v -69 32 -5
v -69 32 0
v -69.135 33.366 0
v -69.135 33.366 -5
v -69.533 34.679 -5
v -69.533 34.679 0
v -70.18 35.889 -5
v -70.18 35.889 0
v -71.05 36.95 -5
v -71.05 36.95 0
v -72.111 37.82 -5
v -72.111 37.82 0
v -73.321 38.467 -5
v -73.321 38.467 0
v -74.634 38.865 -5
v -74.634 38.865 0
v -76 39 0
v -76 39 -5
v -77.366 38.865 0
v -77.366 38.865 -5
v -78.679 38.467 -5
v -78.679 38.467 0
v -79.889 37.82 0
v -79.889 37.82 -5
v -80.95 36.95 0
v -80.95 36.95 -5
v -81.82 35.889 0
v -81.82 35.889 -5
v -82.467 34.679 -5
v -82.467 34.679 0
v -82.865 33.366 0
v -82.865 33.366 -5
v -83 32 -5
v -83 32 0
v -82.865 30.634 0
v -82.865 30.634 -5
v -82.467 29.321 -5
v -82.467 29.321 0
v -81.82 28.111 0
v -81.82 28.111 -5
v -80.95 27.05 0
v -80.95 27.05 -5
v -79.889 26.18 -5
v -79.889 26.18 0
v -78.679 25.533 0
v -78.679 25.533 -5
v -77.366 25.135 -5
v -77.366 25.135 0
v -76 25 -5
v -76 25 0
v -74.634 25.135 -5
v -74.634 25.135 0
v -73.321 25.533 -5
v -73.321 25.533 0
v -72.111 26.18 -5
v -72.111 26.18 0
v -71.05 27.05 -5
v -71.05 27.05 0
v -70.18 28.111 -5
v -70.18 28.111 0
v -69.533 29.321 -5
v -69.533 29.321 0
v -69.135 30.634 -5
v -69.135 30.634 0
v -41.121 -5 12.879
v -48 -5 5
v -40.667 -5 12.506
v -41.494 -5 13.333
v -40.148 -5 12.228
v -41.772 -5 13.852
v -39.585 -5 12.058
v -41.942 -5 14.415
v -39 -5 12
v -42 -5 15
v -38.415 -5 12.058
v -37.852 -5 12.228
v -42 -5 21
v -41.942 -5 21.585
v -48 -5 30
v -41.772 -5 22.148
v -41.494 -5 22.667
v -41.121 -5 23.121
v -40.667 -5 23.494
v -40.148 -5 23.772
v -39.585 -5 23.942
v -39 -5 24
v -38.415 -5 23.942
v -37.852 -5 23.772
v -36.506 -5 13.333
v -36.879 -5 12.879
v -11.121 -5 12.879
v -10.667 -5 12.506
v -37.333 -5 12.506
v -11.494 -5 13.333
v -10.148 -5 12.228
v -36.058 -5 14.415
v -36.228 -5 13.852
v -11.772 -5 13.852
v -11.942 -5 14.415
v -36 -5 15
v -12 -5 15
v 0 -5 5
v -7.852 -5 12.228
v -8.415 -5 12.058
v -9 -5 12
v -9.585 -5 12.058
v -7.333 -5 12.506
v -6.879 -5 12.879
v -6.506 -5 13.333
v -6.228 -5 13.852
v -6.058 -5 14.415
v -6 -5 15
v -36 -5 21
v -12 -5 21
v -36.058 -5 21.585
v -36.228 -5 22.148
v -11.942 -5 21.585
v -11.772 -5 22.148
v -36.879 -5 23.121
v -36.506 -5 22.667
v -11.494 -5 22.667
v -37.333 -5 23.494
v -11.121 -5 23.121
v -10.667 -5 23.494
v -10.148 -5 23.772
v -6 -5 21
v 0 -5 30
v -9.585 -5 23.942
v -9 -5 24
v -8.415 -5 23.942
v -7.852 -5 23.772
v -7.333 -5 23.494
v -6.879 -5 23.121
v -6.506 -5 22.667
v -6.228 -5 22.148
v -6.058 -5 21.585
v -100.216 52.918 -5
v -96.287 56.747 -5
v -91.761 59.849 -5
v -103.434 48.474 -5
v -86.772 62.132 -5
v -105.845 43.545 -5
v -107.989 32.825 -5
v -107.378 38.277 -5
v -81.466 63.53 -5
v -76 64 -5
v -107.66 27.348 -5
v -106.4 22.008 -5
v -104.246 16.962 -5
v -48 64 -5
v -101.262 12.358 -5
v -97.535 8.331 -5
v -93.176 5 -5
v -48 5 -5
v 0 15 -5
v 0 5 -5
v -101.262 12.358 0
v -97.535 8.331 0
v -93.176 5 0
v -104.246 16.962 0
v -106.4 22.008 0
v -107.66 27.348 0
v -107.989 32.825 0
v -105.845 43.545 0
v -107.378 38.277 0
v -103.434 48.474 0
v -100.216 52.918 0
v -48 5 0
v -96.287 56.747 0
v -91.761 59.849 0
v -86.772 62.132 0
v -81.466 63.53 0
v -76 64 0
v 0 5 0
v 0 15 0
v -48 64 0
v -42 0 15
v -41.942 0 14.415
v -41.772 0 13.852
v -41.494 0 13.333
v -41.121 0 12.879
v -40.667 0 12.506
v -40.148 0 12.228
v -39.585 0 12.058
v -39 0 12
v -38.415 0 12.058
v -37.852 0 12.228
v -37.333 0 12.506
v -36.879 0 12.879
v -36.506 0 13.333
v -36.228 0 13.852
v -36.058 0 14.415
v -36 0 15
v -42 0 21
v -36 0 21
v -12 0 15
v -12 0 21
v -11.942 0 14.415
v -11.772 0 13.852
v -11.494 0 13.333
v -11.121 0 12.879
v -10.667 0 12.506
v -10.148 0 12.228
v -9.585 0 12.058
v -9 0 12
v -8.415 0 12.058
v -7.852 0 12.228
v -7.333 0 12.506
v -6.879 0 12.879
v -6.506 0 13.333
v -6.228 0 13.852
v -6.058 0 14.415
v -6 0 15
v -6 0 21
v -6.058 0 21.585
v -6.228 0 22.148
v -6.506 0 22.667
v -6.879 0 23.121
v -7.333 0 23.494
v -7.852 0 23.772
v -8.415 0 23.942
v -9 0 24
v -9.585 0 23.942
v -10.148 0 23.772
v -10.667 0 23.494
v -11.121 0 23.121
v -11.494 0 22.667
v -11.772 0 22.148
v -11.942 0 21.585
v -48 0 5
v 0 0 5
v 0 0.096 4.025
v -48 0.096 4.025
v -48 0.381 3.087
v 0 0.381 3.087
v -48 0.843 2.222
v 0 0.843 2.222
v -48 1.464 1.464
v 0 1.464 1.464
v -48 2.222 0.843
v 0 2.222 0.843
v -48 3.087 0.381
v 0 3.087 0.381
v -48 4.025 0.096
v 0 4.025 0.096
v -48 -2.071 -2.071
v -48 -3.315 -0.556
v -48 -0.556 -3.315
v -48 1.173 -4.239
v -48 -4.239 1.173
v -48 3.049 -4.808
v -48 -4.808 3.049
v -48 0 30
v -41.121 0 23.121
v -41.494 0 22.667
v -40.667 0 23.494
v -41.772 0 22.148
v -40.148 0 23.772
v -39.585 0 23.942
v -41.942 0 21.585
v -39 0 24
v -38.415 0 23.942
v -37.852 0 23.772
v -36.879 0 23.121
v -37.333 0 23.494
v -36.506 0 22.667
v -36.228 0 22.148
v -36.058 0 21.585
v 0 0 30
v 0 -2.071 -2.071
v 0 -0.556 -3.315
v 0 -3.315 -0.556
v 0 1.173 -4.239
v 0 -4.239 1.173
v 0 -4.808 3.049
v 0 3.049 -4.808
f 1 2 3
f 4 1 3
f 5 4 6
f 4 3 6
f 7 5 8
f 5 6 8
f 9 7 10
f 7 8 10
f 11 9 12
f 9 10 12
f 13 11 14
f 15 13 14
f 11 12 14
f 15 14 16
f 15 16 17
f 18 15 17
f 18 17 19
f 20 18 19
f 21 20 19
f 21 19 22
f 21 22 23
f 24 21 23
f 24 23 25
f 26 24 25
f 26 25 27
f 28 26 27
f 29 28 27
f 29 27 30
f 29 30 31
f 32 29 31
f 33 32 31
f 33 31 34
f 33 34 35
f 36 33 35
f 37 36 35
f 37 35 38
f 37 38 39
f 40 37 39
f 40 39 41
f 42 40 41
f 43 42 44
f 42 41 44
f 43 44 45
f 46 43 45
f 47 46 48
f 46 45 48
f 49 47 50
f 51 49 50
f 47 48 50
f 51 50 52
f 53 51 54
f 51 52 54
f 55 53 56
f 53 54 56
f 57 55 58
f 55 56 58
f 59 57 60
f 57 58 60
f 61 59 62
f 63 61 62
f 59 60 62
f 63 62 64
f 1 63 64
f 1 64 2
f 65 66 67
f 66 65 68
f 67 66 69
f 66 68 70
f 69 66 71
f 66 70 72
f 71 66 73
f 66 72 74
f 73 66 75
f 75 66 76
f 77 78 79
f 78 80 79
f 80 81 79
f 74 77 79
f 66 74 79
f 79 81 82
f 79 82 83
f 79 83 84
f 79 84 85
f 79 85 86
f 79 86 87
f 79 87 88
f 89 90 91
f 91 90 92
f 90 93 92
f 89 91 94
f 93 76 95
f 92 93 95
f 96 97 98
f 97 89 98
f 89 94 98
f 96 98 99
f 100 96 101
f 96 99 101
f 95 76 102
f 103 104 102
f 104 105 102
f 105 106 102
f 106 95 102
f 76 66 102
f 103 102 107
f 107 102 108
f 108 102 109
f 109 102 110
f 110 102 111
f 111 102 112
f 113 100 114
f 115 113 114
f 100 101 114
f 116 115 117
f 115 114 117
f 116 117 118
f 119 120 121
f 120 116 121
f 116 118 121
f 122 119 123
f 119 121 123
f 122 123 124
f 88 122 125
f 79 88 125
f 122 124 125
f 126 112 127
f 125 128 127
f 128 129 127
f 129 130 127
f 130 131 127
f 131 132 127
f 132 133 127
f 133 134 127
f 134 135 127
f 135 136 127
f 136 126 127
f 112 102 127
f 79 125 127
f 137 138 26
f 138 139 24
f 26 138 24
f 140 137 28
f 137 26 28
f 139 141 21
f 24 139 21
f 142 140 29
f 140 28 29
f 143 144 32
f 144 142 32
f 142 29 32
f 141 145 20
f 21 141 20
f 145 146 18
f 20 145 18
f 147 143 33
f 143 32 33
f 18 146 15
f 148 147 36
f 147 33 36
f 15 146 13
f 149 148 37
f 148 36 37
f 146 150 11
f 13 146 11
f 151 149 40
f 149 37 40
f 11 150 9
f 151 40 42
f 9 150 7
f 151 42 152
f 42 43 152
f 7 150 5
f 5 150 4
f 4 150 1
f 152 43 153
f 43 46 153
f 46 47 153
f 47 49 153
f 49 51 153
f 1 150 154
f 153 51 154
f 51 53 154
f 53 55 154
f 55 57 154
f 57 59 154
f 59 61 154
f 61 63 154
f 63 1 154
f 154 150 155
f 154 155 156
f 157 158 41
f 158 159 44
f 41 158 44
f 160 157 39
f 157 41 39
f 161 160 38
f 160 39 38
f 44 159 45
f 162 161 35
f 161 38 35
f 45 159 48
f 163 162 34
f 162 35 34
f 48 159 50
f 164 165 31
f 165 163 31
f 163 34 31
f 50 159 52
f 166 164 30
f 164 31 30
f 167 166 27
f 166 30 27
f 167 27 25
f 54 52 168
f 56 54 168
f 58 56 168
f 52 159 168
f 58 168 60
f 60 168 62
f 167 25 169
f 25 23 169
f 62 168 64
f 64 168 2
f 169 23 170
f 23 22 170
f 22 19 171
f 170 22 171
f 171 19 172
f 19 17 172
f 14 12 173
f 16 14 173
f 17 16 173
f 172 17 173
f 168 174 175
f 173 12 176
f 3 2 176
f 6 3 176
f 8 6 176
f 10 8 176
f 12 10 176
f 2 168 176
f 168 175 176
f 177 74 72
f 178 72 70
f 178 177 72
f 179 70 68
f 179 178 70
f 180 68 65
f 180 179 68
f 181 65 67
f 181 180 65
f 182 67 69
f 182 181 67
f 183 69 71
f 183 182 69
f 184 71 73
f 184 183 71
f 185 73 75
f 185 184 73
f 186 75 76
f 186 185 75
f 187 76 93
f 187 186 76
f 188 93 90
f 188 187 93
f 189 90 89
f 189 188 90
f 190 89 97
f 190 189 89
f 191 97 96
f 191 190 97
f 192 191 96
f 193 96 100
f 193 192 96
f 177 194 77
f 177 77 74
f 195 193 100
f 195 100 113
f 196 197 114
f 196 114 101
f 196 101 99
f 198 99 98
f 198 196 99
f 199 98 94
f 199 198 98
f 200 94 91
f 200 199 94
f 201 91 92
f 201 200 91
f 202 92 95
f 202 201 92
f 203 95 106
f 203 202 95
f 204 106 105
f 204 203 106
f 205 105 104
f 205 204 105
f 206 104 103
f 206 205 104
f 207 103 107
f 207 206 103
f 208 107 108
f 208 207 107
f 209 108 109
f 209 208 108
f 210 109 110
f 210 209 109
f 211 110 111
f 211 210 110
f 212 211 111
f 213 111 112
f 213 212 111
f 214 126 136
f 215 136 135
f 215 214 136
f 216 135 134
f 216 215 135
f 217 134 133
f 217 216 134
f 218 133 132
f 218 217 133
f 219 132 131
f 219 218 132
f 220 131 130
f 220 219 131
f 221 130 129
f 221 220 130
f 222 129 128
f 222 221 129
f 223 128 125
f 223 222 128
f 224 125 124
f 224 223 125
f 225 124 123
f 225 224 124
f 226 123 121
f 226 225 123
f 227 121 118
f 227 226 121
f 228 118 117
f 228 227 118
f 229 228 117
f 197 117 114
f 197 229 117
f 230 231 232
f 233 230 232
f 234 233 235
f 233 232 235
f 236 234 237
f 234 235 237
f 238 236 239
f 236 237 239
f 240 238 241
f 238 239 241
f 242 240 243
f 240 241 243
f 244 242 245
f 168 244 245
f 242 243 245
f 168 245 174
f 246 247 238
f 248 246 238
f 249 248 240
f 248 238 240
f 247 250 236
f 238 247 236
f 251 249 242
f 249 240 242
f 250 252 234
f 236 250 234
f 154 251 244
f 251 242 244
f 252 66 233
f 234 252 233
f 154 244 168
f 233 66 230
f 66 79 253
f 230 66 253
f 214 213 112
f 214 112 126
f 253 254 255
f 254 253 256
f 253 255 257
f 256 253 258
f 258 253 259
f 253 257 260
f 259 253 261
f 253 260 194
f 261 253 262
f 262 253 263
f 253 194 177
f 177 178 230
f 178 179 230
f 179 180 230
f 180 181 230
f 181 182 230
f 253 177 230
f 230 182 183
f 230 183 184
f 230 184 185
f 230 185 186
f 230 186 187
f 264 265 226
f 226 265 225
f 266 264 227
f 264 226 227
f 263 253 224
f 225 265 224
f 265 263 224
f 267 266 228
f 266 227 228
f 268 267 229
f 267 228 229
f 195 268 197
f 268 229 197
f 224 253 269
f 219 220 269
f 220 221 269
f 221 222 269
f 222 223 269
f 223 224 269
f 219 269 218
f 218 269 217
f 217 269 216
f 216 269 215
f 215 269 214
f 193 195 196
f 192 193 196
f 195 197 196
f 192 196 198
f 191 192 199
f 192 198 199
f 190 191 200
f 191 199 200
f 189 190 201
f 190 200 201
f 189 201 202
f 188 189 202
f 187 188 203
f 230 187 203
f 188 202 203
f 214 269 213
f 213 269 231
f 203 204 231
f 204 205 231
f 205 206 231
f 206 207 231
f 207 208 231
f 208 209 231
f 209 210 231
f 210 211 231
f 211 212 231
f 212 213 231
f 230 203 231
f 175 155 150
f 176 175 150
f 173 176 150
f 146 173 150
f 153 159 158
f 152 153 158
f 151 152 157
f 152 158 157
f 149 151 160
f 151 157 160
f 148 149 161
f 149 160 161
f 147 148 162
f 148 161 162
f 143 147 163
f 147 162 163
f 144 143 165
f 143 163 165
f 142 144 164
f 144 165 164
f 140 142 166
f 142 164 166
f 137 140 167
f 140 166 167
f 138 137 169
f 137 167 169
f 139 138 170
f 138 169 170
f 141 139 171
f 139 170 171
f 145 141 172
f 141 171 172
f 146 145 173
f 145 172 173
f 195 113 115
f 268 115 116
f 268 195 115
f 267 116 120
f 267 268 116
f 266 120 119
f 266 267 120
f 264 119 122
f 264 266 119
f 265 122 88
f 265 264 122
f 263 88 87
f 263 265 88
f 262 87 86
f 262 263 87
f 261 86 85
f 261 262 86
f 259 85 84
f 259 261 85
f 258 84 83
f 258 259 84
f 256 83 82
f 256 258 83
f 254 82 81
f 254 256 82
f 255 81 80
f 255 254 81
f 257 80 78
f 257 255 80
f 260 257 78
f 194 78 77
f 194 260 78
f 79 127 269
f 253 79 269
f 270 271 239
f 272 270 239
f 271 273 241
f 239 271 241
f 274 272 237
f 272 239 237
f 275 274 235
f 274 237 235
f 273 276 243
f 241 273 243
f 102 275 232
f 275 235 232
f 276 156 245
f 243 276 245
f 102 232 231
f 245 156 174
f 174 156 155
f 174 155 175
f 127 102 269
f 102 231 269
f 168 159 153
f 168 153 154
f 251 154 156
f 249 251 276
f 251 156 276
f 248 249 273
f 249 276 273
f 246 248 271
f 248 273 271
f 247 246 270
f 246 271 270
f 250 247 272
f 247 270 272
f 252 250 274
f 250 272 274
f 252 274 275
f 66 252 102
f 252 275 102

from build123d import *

# Parameters (mm, degrees)
T_LE_DE_BASE_PLI_E1_DEPTH    = 108
ESQUISSE2_W                  = 60
ESQUISSE2_H                  = 10
ENL_V_MAT_EXTRU_1_DEPTH      = 131.326513036
ENL_V_MAT_EXTRU_2_DEPTH      = 10
ENL_V_MAT_EXTRU_3_DEPTH      = 3
ENL_V_MAT_EXTRU_3_DEPTH_BACK = 130.073622402
ENL_V_MAT_EXTRU_4_DEPTH      = 10
ESQUISSE6_R                  = 7
ENL_V_MAT_EXTRU_5_DEPTH      = 10


# Sheet-metal steps are written as plain solids
with BuildPart() as part:
    # Esquisse1 → Tôle de base pliée1 (new body)
    with BuildSketch(Plane.ZY):
        with BuildLine():
            Line((30, 0), (5, 0))
            ThreePointArc((5, 0), (1.464466094, 1.464466094), (0, 5))
            Line((0, 5), (0, 64))
            Line((0, 64), (-5, 64))
            Line((-5, 64), (-5, 5))
            ThreePointArc((-5, 5), (-2.071067812, -2.071067812), (5, -5))
            Line((5, -5), (30, -5))
            Line((30, -5), (30, 0))
        make_face()
    extrude(amount=T_LE_DE_BASE_PLI_E1_DEPTH)

    # Esquisse2 → Enlèv. mat.-Extru.1 (cut, through all)
    with BuildSketch(Plane.XY.offset(30)):
        with Locations((-78, 0)):
            Rectangle(ESQUISSE2_W, ESQUISSE2_H)
    extrude(amount=-ENL_V_MAT_EXTRU_1_DEPTH, mode=Mode.SUBTRACT)

    # Esquisse3 → Enlèv. mat.-Extru.2 (cut)
    with BuildSketch(Plane.XY):
        with BuildLine():
            Line((-76, 64), (-123.136026385, 64))
            Line((-123.136026385, 64), (-123.136026385, 0))
            Line((-123.136026385, 0), (-76, 0))
            ThreePointArc((-76, 0), (-108, 32), (-76, 64))
        make_face()
    extrude(amount=-ENL_V_MAT_EXTRU_2_DEPTH, mode=Mode.SUBTRACT)

    # Esquisse4 → Enlèv. mat.-Extru.3 (cut, two sides: drawn at the far end of the back side and taken through both)
    with BuildSketch(Plane.XY.offset(-ENL_V_MAT_EXTRU_3_DEPTH_BACK)):
        Polygon((172.979910748, -161.583658888), (0, 15), (-48, 64), (-220.979910748, 240.583658888), (132.187407029, 586.543480383), (526.147228524, 184.376162607), align=None)
    extrude(amount=ENL_V_MAT_EXTRU_3_DEPTH + ENL_V_MAT_EXTRU_3_DEPTH_BACK, mode=Mode.SUBTRACT)

    # Esquisse5 → Enlèv. mat.-Extru.4 (cut)
    with BuildSketch(Plane(origin=(0, 0, 0), x_dir=(1, 0, 0), z_dir=(0, 1, 0))):
        with BuildLine():
            Line((-36, -15), (-36, -21))
            ThreePointArc((-36, -21), (-39, -24), (-42, -21))
            Line((-42, -21), (-42, -15))
            ThreePointArc((-42, -15), (-39, -12), (-36, -15))
        make_face()
        with BuildLine():
            Line((-6, -15), (-6, -21))
            ThreePointArc((-6, -21), (-9, -24), (-12, -21))
            Line((-12, -21), (-12, -15))
            ThreePointArc((-12, -15), (-9, -12), (-6, -15))
        make_face()
    extrude(amount=-ENL_V_MAT_EXTRU_4_DEPTH, mode=Mode.SUBTRACT)

    # Esquisse6 → Enlèv. mat.-Extru.5 (cut)
    with BuildSketch(Plane.XY):
        with Locations((-76, 32)):
            Circle(ESQUISSE6_R)
    extrude(amount=-ENL_V_MAT_EXTRU_5_DEPTH, mode=Mode.SUBTRACT)


solid = part.part
